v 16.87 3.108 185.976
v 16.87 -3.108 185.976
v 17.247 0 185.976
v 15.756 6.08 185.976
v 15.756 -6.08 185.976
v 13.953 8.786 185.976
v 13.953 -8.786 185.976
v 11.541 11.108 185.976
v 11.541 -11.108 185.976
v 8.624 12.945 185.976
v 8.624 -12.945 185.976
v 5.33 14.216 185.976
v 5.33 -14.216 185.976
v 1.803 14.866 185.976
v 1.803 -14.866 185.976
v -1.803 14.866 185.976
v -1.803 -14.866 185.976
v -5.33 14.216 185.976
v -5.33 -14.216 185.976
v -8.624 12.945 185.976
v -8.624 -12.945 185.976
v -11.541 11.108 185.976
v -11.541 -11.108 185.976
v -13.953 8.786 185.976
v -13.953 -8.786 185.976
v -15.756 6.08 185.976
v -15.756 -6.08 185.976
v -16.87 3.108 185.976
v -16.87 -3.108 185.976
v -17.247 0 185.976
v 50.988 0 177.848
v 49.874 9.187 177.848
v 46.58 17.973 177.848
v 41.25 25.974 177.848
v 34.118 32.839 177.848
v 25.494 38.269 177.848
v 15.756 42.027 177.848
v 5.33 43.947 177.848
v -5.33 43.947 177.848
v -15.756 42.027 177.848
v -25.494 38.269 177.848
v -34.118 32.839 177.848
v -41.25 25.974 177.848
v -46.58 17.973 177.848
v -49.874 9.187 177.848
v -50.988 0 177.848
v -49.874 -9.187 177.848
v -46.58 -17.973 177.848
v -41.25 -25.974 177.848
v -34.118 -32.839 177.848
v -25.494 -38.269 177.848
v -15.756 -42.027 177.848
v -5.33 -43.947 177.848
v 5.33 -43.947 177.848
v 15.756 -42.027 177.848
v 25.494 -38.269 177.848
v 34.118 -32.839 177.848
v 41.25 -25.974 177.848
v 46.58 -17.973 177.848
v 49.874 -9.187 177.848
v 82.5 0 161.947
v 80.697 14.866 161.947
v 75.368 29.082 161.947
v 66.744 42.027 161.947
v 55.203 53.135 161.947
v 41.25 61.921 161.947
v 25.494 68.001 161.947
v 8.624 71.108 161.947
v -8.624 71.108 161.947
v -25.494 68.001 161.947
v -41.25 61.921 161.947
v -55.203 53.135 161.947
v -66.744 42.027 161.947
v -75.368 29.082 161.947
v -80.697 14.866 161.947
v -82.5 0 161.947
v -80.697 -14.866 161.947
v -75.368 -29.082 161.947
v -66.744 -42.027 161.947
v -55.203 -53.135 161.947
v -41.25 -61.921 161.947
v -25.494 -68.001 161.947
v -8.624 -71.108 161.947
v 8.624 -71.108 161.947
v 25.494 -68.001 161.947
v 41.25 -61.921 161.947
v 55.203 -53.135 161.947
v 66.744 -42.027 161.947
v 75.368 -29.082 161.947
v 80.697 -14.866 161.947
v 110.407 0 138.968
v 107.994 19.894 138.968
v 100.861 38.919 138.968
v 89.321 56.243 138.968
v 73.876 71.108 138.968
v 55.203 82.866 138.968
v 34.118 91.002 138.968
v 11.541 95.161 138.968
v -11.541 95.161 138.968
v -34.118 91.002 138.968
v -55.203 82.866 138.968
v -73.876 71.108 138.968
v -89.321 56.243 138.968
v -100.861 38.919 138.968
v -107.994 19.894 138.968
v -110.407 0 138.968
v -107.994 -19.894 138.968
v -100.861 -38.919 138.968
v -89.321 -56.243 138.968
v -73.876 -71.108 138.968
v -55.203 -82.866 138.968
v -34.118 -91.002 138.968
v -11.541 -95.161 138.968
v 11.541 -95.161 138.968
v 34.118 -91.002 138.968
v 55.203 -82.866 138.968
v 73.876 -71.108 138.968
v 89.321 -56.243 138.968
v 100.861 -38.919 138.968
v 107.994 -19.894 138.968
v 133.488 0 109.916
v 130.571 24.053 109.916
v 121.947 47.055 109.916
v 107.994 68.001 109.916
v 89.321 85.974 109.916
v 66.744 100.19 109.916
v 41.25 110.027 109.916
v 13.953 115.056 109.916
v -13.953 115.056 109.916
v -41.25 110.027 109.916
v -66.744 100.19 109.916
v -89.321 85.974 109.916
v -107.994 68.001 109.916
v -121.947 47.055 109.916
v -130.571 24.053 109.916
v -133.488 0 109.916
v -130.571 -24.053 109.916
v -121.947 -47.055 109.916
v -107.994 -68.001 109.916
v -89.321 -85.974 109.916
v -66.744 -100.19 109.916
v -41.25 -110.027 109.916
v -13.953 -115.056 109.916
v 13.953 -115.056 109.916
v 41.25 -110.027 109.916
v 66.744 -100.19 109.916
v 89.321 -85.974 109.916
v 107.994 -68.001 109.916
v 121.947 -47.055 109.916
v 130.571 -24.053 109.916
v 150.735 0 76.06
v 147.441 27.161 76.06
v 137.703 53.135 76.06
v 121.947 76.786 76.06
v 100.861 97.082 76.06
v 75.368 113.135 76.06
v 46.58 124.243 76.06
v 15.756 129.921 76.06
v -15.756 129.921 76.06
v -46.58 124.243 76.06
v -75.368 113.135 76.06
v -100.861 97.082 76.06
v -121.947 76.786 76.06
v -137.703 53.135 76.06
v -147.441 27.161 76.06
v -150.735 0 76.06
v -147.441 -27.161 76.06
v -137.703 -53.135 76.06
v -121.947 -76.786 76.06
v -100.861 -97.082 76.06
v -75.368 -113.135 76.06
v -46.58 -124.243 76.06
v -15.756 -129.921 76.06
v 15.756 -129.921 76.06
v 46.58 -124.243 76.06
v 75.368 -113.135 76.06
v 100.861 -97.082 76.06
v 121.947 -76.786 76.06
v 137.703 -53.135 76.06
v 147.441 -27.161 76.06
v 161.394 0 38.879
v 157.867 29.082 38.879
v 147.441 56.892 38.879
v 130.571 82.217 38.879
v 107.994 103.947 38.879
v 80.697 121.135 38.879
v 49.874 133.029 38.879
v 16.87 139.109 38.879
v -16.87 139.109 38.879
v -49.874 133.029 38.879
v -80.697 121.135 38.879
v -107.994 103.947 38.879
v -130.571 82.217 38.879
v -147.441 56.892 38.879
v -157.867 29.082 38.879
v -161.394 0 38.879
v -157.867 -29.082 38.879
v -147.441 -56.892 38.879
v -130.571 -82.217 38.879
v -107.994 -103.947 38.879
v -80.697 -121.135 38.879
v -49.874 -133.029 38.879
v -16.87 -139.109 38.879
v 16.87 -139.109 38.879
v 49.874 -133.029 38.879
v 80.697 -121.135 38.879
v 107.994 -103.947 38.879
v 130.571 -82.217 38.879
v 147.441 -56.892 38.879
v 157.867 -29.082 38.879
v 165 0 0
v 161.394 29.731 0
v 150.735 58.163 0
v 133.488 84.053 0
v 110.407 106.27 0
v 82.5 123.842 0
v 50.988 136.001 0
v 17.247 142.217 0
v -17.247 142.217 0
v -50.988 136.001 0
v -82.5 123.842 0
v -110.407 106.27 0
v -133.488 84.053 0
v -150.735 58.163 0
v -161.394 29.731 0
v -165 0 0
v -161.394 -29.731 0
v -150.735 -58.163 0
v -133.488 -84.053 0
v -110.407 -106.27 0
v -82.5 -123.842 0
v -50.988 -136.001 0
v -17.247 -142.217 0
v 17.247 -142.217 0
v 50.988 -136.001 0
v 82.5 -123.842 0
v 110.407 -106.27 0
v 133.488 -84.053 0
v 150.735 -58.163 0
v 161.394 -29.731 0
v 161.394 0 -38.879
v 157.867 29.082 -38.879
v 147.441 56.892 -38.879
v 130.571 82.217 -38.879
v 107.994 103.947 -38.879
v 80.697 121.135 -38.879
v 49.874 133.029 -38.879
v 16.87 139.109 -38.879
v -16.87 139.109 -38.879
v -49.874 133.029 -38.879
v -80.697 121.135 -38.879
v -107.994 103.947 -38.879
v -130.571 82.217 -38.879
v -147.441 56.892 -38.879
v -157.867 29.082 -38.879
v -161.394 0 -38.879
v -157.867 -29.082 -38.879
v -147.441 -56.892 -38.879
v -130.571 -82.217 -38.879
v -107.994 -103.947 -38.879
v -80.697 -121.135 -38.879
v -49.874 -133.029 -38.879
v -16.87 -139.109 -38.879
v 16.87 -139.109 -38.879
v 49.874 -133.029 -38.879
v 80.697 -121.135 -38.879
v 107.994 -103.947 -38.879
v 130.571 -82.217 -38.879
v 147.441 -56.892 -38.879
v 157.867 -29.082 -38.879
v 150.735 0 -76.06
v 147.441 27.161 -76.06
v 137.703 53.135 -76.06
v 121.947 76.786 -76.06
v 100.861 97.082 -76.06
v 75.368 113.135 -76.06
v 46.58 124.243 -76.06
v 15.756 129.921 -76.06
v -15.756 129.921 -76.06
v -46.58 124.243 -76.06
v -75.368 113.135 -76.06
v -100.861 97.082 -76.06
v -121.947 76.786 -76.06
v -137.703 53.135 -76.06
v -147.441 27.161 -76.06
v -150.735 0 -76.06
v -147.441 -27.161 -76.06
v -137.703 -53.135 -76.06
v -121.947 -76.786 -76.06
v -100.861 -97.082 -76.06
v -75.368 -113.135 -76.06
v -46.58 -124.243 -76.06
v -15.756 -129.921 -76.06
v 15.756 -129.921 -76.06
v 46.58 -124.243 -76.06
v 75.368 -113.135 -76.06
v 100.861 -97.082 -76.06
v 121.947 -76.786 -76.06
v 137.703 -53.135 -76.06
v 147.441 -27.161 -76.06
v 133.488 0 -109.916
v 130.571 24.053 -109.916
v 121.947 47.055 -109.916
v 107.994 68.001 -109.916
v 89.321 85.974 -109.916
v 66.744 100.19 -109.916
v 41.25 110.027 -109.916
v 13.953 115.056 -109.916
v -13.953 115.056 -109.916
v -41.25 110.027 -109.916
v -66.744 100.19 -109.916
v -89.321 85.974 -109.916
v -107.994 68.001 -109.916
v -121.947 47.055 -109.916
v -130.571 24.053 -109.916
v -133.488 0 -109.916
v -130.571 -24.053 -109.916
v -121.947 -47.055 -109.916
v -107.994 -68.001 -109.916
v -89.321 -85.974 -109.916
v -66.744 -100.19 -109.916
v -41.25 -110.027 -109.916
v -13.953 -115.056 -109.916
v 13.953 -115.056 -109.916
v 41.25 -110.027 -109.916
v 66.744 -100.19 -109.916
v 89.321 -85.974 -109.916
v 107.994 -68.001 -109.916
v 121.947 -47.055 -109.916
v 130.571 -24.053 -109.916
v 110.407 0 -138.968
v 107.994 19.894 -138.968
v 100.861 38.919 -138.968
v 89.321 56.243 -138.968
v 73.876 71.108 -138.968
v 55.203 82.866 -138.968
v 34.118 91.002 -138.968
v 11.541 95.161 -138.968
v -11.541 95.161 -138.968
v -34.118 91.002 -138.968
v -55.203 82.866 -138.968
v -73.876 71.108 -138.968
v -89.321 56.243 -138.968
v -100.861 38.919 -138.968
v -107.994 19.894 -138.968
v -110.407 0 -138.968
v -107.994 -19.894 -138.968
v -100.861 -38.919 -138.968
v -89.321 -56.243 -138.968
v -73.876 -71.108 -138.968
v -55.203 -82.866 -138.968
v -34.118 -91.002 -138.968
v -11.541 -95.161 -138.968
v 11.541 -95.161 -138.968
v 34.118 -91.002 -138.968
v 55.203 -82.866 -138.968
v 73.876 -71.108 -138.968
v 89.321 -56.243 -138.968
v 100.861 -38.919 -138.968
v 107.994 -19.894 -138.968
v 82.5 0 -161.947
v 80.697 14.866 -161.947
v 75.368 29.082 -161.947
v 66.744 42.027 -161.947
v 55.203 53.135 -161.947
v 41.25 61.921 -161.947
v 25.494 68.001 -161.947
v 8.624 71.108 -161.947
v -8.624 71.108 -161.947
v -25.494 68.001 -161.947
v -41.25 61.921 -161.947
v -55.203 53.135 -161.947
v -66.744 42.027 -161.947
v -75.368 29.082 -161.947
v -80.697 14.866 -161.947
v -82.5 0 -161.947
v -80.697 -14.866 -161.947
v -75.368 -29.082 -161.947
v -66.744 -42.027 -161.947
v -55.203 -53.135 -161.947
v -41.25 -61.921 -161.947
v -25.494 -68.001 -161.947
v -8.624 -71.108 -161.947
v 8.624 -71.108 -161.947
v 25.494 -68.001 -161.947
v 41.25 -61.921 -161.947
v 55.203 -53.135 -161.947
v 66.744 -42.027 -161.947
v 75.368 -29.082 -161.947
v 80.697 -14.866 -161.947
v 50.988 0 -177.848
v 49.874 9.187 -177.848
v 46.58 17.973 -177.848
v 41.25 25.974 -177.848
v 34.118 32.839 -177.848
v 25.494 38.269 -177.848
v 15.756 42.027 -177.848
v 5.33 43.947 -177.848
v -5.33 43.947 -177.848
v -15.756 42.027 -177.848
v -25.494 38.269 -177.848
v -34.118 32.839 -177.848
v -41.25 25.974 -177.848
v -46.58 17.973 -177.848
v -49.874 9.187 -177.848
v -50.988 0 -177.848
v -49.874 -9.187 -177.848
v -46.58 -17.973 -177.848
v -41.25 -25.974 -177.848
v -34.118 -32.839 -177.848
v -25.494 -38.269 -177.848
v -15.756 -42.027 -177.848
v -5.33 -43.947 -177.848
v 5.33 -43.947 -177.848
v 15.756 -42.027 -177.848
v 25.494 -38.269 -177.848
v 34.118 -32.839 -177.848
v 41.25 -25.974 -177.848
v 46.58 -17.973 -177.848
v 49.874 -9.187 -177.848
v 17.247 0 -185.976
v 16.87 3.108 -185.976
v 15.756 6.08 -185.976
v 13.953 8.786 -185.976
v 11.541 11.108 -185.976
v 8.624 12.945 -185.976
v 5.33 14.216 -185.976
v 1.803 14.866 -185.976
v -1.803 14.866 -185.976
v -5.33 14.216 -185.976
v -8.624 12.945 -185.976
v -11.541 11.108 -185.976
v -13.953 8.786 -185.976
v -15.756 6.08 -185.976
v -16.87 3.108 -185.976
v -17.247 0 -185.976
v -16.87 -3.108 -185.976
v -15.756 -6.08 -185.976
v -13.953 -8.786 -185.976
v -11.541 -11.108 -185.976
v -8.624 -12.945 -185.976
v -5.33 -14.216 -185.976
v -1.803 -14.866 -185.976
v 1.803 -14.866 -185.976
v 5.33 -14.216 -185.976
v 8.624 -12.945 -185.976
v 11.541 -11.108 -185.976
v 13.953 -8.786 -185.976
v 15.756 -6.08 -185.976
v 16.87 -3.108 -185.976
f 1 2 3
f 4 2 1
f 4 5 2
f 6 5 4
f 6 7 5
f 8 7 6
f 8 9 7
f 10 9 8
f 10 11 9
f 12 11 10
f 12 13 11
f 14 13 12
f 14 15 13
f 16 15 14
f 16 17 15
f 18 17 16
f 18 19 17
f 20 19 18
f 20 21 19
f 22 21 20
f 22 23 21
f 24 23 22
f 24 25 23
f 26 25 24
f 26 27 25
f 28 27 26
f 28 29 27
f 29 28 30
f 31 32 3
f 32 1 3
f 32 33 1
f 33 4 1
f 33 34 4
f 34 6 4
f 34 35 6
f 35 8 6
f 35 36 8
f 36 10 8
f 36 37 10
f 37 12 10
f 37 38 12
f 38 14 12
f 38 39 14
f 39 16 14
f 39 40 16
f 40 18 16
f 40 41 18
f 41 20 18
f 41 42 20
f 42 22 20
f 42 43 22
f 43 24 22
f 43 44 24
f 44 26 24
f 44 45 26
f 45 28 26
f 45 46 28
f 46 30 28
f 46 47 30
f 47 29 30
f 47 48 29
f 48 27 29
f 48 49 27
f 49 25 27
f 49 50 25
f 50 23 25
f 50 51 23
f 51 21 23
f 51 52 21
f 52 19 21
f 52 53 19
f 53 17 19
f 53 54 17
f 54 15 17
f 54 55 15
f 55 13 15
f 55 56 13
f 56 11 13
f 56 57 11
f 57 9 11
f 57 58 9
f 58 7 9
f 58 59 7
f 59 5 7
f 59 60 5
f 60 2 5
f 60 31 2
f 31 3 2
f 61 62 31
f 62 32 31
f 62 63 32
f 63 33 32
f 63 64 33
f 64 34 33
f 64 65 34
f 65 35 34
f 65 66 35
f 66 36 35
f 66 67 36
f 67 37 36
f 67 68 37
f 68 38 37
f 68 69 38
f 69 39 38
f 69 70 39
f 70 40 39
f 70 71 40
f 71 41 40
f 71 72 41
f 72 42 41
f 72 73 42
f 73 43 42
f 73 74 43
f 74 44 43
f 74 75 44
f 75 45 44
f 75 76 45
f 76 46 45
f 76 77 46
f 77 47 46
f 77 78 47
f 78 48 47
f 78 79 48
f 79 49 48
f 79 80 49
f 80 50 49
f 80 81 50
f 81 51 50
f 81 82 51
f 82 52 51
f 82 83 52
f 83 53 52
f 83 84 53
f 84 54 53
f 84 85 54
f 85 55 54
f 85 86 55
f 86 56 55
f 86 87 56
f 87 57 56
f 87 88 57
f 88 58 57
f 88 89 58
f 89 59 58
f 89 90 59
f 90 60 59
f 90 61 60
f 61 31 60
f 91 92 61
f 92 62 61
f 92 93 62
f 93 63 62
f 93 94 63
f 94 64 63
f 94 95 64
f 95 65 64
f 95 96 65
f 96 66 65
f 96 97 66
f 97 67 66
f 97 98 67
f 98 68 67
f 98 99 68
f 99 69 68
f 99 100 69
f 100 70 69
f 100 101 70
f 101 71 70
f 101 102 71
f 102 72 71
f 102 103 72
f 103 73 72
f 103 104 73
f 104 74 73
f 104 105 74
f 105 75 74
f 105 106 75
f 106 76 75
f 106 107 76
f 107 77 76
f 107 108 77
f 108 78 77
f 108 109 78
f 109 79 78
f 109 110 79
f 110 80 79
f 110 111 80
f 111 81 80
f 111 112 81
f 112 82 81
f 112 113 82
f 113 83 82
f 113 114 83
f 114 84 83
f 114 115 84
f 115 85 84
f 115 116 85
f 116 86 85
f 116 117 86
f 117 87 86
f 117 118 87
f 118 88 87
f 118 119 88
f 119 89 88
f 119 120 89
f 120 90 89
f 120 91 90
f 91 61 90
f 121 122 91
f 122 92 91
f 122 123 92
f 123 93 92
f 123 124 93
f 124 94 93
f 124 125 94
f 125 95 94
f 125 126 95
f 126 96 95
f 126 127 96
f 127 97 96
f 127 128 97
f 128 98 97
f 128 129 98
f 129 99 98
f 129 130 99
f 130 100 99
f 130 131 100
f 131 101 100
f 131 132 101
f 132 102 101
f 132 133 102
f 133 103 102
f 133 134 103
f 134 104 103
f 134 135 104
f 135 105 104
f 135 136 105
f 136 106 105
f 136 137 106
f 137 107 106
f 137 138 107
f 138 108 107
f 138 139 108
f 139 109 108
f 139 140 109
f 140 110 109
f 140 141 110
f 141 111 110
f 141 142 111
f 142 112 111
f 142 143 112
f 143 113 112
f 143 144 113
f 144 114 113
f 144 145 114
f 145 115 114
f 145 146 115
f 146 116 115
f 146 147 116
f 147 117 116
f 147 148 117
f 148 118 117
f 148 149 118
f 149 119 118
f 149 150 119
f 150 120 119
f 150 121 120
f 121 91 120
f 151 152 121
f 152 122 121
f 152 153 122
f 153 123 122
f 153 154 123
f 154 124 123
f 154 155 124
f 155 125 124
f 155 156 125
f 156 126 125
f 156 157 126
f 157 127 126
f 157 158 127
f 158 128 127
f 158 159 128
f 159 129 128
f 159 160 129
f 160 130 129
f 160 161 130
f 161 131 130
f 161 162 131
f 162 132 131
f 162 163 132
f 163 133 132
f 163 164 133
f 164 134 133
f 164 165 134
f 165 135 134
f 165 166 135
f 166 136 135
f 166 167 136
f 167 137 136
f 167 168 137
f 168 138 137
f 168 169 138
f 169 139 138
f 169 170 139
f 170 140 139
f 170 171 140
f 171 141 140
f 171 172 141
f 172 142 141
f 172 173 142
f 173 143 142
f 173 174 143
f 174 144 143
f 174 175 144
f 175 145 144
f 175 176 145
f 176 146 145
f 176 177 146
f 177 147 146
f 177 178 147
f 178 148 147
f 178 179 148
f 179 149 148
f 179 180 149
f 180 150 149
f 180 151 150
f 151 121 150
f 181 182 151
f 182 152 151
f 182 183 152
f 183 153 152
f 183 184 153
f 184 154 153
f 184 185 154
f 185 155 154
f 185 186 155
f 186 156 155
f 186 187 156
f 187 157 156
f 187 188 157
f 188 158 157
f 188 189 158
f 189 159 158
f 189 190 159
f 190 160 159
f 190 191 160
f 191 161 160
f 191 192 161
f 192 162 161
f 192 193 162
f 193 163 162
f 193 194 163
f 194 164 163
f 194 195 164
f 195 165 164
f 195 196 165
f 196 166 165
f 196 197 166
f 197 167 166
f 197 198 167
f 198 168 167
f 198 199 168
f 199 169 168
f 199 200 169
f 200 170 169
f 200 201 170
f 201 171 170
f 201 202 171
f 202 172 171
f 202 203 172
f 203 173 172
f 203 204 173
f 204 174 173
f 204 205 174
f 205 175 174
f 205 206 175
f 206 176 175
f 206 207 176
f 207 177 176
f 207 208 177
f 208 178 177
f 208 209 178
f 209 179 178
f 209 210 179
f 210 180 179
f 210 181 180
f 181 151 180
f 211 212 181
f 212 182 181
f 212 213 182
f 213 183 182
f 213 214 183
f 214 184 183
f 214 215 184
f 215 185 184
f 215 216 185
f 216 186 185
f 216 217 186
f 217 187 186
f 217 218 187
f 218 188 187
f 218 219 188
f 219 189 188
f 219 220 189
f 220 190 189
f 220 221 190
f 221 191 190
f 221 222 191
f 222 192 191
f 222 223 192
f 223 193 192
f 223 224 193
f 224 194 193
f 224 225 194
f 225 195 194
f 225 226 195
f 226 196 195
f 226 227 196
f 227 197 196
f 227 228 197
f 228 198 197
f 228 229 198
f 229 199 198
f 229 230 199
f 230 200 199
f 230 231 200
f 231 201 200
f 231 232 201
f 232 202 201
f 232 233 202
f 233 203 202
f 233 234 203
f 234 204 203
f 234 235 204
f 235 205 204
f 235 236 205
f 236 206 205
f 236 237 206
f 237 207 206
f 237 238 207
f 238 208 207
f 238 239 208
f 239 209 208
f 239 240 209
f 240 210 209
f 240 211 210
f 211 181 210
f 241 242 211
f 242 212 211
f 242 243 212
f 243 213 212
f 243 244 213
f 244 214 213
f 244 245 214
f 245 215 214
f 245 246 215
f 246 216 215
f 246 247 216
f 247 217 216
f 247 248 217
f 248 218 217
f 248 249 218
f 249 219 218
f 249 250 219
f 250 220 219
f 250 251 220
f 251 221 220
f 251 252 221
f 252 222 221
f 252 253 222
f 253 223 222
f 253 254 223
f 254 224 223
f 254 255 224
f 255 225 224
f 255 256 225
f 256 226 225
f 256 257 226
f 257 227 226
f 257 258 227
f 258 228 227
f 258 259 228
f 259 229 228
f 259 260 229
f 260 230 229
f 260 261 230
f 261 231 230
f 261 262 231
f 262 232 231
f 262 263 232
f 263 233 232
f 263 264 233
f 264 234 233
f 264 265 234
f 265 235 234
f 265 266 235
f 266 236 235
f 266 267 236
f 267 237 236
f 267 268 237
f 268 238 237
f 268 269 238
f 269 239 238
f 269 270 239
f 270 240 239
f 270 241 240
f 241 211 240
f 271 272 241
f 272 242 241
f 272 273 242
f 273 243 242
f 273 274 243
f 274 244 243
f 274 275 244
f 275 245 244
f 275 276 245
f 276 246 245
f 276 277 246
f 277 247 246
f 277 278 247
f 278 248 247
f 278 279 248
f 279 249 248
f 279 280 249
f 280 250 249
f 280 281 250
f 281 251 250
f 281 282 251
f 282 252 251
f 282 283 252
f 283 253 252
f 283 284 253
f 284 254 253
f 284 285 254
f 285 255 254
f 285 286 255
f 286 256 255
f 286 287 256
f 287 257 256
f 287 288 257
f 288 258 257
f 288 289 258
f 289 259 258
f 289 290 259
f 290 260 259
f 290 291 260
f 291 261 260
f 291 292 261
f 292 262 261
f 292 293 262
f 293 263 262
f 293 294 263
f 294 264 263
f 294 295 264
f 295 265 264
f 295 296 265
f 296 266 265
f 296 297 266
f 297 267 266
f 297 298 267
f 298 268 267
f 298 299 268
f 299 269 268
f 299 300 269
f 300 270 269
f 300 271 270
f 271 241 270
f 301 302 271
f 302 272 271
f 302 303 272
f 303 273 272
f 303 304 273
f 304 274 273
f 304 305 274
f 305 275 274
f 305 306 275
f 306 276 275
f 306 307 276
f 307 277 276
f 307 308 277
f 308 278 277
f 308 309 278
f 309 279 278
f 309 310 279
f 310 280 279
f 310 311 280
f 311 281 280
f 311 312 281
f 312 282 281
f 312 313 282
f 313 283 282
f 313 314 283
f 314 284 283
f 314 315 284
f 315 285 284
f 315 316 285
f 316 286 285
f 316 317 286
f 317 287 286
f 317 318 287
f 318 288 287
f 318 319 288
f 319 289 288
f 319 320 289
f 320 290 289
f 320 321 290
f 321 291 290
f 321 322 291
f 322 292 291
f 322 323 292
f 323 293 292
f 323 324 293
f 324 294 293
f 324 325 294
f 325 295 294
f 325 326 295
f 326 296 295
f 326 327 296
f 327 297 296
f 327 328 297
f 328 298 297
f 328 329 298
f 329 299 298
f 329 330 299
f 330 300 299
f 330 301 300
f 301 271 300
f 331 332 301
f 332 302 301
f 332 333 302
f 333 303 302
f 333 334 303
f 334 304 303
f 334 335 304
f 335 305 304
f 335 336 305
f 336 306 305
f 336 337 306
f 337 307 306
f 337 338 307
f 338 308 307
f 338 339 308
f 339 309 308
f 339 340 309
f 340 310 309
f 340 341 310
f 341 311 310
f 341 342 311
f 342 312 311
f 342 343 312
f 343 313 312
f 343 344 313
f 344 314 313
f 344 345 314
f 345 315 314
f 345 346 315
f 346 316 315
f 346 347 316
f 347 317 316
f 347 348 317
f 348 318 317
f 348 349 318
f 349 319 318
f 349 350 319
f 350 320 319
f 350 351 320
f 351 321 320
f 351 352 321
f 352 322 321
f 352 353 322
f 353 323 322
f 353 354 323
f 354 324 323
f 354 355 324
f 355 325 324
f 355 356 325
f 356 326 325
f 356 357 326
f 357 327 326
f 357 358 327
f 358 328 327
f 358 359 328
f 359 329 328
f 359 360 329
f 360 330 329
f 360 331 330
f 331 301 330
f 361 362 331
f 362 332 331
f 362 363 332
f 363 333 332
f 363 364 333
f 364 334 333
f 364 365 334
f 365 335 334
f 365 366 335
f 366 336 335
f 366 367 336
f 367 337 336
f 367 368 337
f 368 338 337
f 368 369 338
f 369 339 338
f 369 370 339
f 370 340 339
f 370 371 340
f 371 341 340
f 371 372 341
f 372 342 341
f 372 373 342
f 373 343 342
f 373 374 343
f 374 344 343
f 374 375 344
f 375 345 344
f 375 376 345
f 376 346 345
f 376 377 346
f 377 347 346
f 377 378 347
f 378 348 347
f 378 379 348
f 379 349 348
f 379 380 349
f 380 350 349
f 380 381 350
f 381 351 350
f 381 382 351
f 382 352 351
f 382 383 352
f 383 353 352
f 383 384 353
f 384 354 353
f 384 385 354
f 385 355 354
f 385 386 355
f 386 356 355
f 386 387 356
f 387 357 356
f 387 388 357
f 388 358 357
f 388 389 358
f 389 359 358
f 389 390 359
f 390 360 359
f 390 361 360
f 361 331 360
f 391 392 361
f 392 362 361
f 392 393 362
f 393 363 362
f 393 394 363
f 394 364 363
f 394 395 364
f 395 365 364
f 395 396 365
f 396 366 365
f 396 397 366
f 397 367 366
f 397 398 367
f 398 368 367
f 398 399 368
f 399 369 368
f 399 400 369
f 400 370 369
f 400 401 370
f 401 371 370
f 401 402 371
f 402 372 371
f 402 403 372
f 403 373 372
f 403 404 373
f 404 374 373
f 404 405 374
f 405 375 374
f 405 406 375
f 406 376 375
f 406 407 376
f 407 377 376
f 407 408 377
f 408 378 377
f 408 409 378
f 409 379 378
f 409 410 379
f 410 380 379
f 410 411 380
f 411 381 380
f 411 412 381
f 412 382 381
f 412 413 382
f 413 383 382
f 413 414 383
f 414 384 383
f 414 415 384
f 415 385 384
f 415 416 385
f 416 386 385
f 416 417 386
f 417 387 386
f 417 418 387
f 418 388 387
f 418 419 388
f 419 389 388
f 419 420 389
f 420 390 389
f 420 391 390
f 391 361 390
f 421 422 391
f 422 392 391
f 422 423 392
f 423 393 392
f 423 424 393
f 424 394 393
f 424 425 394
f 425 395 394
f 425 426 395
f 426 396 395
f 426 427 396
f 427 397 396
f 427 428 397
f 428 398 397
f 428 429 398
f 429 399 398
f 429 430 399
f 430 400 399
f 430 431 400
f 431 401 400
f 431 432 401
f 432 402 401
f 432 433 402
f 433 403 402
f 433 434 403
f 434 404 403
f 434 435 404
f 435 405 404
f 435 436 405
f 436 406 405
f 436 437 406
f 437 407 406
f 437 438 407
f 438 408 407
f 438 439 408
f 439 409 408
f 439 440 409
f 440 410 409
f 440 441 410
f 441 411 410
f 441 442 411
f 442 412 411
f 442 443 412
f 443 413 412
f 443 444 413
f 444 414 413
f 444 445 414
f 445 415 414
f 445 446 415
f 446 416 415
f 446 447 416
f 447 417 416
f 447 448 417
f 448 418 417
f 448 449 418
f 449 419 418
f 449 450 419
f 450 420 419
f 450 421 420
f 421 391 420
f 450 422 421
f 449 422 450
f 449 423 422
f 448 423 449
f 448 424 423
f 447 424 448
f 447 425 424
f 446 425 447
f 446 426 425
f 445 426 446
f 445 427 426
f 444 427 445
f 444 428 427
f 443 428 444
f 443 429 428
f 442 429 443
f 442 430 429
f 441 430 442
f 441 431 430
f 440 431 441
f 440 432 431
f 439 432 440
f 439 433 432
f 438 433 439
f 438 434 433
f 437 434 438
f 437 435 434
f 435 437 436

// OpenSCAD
// Generated by SolidPython 1.0.1 on 2020-07-29 00:46:52


scale(v = [15, 13, 17]) {
	sphere(r = 11);
}
/***********************************************
*********      SolidPython code:      **********
************************************************
 
# import packages: SolidPython
from solid import *
from solid.utils import *
from itertools import chain, combinations, permutations


class Resize:

    def __init__(self, scad_file):
        self.scad_file = scad_file
        #self.scad_file = import_scad(scad_file)
        # cone/cylinder param:
        self.r1 = 0
        self.r2 = 0
        self.h = 0
        # rectangular prism param:
        self.w = 0
        self.l = 0
        # ellipse param:
        self.r = 0

    # import OpenScad code (file name corresponds to shape)


    # classify shape + parameters
    def assign(self, param1, param2, param3):
        if self.scad_file == 'cone.scad':
            self.r1 = param1
            self.r2 = param2
            self.h = param3
        elif self.scad_file == 'cylinder.scad':
            self.r1 = param1
            self.r2 = param2
            self.h = param3
        elif self.scad_file == 'rectangularPrism.scad':
            self.h = param1
            self.l = param2
            self.w = param3
        else:
            self.r = param1
            self.h = param2

    # resize parameters
    def iterate(self):
        x = range(3, 20, 2)
        i = 1
        if self.scad_file == 'cone.scad':
            tempList = list(permutations(x, 2))
            for temp in tempList:
                param1 = temp[0]
                param2 = temp[1]
                filepath = 'produced_scad_files/' + 'cone' + str(param1) + '_' + str(param2) + '_' + '.scad'
                scad_render_to_file(cylinder(h=param1, r1=param2, r2=0), filepath)

        elif self.scad_file == 'cylinder.scad':
            tempList = list(permutations(x, 3))
            for temp in tempList:
                param1 = temp[0]
                param2 = temp[1]
                filepath = 'produced_scad_files/' + 'cylinder' + str(param1) + '_' + str(param2) + '_' + '.scad'
                scad_render_to_file(cylinder(h=param1, r1=param2, r2=param2), filepath)

        elif self.scad_file == 'rectangularPrism.scad':
            tempList = list(permutations(x, 3))
            for temp in tempList:
                param1 = temp[0]
                param2 = temp[1]
                param3 = temp[2]
                filepath = 'produced_scad_files/' + 'rectangularPrism' + str(param1) + '_' + str(param2) + '_' + str(
                    param3) + '.scad'
                scad_render_to_file(cube(size=(param1, param2, param3)), filepath)

        elif self.scad_file == 'ellipse.scad':
            tempList = list(permutations(x, 4))
            for temp in tempList:
                param1 = temp[0]
                param2 = temp[1]
                param3 = temp[2]
                param4 = temp[3]
                filepath = 'produced_scad_files/' + 'ellipse' + str(param1) + '_' + str(param2) + '_' + str(param3) + '_' + str(param4) + '.scad'
                scad_render_to_file(scale([param1, param2, param3])(sphere(r=param4)), filepath)

    def render_to_scadfile(self):
        scad_render_to_file(scad, 'example.scad') 
 
************************************************/
